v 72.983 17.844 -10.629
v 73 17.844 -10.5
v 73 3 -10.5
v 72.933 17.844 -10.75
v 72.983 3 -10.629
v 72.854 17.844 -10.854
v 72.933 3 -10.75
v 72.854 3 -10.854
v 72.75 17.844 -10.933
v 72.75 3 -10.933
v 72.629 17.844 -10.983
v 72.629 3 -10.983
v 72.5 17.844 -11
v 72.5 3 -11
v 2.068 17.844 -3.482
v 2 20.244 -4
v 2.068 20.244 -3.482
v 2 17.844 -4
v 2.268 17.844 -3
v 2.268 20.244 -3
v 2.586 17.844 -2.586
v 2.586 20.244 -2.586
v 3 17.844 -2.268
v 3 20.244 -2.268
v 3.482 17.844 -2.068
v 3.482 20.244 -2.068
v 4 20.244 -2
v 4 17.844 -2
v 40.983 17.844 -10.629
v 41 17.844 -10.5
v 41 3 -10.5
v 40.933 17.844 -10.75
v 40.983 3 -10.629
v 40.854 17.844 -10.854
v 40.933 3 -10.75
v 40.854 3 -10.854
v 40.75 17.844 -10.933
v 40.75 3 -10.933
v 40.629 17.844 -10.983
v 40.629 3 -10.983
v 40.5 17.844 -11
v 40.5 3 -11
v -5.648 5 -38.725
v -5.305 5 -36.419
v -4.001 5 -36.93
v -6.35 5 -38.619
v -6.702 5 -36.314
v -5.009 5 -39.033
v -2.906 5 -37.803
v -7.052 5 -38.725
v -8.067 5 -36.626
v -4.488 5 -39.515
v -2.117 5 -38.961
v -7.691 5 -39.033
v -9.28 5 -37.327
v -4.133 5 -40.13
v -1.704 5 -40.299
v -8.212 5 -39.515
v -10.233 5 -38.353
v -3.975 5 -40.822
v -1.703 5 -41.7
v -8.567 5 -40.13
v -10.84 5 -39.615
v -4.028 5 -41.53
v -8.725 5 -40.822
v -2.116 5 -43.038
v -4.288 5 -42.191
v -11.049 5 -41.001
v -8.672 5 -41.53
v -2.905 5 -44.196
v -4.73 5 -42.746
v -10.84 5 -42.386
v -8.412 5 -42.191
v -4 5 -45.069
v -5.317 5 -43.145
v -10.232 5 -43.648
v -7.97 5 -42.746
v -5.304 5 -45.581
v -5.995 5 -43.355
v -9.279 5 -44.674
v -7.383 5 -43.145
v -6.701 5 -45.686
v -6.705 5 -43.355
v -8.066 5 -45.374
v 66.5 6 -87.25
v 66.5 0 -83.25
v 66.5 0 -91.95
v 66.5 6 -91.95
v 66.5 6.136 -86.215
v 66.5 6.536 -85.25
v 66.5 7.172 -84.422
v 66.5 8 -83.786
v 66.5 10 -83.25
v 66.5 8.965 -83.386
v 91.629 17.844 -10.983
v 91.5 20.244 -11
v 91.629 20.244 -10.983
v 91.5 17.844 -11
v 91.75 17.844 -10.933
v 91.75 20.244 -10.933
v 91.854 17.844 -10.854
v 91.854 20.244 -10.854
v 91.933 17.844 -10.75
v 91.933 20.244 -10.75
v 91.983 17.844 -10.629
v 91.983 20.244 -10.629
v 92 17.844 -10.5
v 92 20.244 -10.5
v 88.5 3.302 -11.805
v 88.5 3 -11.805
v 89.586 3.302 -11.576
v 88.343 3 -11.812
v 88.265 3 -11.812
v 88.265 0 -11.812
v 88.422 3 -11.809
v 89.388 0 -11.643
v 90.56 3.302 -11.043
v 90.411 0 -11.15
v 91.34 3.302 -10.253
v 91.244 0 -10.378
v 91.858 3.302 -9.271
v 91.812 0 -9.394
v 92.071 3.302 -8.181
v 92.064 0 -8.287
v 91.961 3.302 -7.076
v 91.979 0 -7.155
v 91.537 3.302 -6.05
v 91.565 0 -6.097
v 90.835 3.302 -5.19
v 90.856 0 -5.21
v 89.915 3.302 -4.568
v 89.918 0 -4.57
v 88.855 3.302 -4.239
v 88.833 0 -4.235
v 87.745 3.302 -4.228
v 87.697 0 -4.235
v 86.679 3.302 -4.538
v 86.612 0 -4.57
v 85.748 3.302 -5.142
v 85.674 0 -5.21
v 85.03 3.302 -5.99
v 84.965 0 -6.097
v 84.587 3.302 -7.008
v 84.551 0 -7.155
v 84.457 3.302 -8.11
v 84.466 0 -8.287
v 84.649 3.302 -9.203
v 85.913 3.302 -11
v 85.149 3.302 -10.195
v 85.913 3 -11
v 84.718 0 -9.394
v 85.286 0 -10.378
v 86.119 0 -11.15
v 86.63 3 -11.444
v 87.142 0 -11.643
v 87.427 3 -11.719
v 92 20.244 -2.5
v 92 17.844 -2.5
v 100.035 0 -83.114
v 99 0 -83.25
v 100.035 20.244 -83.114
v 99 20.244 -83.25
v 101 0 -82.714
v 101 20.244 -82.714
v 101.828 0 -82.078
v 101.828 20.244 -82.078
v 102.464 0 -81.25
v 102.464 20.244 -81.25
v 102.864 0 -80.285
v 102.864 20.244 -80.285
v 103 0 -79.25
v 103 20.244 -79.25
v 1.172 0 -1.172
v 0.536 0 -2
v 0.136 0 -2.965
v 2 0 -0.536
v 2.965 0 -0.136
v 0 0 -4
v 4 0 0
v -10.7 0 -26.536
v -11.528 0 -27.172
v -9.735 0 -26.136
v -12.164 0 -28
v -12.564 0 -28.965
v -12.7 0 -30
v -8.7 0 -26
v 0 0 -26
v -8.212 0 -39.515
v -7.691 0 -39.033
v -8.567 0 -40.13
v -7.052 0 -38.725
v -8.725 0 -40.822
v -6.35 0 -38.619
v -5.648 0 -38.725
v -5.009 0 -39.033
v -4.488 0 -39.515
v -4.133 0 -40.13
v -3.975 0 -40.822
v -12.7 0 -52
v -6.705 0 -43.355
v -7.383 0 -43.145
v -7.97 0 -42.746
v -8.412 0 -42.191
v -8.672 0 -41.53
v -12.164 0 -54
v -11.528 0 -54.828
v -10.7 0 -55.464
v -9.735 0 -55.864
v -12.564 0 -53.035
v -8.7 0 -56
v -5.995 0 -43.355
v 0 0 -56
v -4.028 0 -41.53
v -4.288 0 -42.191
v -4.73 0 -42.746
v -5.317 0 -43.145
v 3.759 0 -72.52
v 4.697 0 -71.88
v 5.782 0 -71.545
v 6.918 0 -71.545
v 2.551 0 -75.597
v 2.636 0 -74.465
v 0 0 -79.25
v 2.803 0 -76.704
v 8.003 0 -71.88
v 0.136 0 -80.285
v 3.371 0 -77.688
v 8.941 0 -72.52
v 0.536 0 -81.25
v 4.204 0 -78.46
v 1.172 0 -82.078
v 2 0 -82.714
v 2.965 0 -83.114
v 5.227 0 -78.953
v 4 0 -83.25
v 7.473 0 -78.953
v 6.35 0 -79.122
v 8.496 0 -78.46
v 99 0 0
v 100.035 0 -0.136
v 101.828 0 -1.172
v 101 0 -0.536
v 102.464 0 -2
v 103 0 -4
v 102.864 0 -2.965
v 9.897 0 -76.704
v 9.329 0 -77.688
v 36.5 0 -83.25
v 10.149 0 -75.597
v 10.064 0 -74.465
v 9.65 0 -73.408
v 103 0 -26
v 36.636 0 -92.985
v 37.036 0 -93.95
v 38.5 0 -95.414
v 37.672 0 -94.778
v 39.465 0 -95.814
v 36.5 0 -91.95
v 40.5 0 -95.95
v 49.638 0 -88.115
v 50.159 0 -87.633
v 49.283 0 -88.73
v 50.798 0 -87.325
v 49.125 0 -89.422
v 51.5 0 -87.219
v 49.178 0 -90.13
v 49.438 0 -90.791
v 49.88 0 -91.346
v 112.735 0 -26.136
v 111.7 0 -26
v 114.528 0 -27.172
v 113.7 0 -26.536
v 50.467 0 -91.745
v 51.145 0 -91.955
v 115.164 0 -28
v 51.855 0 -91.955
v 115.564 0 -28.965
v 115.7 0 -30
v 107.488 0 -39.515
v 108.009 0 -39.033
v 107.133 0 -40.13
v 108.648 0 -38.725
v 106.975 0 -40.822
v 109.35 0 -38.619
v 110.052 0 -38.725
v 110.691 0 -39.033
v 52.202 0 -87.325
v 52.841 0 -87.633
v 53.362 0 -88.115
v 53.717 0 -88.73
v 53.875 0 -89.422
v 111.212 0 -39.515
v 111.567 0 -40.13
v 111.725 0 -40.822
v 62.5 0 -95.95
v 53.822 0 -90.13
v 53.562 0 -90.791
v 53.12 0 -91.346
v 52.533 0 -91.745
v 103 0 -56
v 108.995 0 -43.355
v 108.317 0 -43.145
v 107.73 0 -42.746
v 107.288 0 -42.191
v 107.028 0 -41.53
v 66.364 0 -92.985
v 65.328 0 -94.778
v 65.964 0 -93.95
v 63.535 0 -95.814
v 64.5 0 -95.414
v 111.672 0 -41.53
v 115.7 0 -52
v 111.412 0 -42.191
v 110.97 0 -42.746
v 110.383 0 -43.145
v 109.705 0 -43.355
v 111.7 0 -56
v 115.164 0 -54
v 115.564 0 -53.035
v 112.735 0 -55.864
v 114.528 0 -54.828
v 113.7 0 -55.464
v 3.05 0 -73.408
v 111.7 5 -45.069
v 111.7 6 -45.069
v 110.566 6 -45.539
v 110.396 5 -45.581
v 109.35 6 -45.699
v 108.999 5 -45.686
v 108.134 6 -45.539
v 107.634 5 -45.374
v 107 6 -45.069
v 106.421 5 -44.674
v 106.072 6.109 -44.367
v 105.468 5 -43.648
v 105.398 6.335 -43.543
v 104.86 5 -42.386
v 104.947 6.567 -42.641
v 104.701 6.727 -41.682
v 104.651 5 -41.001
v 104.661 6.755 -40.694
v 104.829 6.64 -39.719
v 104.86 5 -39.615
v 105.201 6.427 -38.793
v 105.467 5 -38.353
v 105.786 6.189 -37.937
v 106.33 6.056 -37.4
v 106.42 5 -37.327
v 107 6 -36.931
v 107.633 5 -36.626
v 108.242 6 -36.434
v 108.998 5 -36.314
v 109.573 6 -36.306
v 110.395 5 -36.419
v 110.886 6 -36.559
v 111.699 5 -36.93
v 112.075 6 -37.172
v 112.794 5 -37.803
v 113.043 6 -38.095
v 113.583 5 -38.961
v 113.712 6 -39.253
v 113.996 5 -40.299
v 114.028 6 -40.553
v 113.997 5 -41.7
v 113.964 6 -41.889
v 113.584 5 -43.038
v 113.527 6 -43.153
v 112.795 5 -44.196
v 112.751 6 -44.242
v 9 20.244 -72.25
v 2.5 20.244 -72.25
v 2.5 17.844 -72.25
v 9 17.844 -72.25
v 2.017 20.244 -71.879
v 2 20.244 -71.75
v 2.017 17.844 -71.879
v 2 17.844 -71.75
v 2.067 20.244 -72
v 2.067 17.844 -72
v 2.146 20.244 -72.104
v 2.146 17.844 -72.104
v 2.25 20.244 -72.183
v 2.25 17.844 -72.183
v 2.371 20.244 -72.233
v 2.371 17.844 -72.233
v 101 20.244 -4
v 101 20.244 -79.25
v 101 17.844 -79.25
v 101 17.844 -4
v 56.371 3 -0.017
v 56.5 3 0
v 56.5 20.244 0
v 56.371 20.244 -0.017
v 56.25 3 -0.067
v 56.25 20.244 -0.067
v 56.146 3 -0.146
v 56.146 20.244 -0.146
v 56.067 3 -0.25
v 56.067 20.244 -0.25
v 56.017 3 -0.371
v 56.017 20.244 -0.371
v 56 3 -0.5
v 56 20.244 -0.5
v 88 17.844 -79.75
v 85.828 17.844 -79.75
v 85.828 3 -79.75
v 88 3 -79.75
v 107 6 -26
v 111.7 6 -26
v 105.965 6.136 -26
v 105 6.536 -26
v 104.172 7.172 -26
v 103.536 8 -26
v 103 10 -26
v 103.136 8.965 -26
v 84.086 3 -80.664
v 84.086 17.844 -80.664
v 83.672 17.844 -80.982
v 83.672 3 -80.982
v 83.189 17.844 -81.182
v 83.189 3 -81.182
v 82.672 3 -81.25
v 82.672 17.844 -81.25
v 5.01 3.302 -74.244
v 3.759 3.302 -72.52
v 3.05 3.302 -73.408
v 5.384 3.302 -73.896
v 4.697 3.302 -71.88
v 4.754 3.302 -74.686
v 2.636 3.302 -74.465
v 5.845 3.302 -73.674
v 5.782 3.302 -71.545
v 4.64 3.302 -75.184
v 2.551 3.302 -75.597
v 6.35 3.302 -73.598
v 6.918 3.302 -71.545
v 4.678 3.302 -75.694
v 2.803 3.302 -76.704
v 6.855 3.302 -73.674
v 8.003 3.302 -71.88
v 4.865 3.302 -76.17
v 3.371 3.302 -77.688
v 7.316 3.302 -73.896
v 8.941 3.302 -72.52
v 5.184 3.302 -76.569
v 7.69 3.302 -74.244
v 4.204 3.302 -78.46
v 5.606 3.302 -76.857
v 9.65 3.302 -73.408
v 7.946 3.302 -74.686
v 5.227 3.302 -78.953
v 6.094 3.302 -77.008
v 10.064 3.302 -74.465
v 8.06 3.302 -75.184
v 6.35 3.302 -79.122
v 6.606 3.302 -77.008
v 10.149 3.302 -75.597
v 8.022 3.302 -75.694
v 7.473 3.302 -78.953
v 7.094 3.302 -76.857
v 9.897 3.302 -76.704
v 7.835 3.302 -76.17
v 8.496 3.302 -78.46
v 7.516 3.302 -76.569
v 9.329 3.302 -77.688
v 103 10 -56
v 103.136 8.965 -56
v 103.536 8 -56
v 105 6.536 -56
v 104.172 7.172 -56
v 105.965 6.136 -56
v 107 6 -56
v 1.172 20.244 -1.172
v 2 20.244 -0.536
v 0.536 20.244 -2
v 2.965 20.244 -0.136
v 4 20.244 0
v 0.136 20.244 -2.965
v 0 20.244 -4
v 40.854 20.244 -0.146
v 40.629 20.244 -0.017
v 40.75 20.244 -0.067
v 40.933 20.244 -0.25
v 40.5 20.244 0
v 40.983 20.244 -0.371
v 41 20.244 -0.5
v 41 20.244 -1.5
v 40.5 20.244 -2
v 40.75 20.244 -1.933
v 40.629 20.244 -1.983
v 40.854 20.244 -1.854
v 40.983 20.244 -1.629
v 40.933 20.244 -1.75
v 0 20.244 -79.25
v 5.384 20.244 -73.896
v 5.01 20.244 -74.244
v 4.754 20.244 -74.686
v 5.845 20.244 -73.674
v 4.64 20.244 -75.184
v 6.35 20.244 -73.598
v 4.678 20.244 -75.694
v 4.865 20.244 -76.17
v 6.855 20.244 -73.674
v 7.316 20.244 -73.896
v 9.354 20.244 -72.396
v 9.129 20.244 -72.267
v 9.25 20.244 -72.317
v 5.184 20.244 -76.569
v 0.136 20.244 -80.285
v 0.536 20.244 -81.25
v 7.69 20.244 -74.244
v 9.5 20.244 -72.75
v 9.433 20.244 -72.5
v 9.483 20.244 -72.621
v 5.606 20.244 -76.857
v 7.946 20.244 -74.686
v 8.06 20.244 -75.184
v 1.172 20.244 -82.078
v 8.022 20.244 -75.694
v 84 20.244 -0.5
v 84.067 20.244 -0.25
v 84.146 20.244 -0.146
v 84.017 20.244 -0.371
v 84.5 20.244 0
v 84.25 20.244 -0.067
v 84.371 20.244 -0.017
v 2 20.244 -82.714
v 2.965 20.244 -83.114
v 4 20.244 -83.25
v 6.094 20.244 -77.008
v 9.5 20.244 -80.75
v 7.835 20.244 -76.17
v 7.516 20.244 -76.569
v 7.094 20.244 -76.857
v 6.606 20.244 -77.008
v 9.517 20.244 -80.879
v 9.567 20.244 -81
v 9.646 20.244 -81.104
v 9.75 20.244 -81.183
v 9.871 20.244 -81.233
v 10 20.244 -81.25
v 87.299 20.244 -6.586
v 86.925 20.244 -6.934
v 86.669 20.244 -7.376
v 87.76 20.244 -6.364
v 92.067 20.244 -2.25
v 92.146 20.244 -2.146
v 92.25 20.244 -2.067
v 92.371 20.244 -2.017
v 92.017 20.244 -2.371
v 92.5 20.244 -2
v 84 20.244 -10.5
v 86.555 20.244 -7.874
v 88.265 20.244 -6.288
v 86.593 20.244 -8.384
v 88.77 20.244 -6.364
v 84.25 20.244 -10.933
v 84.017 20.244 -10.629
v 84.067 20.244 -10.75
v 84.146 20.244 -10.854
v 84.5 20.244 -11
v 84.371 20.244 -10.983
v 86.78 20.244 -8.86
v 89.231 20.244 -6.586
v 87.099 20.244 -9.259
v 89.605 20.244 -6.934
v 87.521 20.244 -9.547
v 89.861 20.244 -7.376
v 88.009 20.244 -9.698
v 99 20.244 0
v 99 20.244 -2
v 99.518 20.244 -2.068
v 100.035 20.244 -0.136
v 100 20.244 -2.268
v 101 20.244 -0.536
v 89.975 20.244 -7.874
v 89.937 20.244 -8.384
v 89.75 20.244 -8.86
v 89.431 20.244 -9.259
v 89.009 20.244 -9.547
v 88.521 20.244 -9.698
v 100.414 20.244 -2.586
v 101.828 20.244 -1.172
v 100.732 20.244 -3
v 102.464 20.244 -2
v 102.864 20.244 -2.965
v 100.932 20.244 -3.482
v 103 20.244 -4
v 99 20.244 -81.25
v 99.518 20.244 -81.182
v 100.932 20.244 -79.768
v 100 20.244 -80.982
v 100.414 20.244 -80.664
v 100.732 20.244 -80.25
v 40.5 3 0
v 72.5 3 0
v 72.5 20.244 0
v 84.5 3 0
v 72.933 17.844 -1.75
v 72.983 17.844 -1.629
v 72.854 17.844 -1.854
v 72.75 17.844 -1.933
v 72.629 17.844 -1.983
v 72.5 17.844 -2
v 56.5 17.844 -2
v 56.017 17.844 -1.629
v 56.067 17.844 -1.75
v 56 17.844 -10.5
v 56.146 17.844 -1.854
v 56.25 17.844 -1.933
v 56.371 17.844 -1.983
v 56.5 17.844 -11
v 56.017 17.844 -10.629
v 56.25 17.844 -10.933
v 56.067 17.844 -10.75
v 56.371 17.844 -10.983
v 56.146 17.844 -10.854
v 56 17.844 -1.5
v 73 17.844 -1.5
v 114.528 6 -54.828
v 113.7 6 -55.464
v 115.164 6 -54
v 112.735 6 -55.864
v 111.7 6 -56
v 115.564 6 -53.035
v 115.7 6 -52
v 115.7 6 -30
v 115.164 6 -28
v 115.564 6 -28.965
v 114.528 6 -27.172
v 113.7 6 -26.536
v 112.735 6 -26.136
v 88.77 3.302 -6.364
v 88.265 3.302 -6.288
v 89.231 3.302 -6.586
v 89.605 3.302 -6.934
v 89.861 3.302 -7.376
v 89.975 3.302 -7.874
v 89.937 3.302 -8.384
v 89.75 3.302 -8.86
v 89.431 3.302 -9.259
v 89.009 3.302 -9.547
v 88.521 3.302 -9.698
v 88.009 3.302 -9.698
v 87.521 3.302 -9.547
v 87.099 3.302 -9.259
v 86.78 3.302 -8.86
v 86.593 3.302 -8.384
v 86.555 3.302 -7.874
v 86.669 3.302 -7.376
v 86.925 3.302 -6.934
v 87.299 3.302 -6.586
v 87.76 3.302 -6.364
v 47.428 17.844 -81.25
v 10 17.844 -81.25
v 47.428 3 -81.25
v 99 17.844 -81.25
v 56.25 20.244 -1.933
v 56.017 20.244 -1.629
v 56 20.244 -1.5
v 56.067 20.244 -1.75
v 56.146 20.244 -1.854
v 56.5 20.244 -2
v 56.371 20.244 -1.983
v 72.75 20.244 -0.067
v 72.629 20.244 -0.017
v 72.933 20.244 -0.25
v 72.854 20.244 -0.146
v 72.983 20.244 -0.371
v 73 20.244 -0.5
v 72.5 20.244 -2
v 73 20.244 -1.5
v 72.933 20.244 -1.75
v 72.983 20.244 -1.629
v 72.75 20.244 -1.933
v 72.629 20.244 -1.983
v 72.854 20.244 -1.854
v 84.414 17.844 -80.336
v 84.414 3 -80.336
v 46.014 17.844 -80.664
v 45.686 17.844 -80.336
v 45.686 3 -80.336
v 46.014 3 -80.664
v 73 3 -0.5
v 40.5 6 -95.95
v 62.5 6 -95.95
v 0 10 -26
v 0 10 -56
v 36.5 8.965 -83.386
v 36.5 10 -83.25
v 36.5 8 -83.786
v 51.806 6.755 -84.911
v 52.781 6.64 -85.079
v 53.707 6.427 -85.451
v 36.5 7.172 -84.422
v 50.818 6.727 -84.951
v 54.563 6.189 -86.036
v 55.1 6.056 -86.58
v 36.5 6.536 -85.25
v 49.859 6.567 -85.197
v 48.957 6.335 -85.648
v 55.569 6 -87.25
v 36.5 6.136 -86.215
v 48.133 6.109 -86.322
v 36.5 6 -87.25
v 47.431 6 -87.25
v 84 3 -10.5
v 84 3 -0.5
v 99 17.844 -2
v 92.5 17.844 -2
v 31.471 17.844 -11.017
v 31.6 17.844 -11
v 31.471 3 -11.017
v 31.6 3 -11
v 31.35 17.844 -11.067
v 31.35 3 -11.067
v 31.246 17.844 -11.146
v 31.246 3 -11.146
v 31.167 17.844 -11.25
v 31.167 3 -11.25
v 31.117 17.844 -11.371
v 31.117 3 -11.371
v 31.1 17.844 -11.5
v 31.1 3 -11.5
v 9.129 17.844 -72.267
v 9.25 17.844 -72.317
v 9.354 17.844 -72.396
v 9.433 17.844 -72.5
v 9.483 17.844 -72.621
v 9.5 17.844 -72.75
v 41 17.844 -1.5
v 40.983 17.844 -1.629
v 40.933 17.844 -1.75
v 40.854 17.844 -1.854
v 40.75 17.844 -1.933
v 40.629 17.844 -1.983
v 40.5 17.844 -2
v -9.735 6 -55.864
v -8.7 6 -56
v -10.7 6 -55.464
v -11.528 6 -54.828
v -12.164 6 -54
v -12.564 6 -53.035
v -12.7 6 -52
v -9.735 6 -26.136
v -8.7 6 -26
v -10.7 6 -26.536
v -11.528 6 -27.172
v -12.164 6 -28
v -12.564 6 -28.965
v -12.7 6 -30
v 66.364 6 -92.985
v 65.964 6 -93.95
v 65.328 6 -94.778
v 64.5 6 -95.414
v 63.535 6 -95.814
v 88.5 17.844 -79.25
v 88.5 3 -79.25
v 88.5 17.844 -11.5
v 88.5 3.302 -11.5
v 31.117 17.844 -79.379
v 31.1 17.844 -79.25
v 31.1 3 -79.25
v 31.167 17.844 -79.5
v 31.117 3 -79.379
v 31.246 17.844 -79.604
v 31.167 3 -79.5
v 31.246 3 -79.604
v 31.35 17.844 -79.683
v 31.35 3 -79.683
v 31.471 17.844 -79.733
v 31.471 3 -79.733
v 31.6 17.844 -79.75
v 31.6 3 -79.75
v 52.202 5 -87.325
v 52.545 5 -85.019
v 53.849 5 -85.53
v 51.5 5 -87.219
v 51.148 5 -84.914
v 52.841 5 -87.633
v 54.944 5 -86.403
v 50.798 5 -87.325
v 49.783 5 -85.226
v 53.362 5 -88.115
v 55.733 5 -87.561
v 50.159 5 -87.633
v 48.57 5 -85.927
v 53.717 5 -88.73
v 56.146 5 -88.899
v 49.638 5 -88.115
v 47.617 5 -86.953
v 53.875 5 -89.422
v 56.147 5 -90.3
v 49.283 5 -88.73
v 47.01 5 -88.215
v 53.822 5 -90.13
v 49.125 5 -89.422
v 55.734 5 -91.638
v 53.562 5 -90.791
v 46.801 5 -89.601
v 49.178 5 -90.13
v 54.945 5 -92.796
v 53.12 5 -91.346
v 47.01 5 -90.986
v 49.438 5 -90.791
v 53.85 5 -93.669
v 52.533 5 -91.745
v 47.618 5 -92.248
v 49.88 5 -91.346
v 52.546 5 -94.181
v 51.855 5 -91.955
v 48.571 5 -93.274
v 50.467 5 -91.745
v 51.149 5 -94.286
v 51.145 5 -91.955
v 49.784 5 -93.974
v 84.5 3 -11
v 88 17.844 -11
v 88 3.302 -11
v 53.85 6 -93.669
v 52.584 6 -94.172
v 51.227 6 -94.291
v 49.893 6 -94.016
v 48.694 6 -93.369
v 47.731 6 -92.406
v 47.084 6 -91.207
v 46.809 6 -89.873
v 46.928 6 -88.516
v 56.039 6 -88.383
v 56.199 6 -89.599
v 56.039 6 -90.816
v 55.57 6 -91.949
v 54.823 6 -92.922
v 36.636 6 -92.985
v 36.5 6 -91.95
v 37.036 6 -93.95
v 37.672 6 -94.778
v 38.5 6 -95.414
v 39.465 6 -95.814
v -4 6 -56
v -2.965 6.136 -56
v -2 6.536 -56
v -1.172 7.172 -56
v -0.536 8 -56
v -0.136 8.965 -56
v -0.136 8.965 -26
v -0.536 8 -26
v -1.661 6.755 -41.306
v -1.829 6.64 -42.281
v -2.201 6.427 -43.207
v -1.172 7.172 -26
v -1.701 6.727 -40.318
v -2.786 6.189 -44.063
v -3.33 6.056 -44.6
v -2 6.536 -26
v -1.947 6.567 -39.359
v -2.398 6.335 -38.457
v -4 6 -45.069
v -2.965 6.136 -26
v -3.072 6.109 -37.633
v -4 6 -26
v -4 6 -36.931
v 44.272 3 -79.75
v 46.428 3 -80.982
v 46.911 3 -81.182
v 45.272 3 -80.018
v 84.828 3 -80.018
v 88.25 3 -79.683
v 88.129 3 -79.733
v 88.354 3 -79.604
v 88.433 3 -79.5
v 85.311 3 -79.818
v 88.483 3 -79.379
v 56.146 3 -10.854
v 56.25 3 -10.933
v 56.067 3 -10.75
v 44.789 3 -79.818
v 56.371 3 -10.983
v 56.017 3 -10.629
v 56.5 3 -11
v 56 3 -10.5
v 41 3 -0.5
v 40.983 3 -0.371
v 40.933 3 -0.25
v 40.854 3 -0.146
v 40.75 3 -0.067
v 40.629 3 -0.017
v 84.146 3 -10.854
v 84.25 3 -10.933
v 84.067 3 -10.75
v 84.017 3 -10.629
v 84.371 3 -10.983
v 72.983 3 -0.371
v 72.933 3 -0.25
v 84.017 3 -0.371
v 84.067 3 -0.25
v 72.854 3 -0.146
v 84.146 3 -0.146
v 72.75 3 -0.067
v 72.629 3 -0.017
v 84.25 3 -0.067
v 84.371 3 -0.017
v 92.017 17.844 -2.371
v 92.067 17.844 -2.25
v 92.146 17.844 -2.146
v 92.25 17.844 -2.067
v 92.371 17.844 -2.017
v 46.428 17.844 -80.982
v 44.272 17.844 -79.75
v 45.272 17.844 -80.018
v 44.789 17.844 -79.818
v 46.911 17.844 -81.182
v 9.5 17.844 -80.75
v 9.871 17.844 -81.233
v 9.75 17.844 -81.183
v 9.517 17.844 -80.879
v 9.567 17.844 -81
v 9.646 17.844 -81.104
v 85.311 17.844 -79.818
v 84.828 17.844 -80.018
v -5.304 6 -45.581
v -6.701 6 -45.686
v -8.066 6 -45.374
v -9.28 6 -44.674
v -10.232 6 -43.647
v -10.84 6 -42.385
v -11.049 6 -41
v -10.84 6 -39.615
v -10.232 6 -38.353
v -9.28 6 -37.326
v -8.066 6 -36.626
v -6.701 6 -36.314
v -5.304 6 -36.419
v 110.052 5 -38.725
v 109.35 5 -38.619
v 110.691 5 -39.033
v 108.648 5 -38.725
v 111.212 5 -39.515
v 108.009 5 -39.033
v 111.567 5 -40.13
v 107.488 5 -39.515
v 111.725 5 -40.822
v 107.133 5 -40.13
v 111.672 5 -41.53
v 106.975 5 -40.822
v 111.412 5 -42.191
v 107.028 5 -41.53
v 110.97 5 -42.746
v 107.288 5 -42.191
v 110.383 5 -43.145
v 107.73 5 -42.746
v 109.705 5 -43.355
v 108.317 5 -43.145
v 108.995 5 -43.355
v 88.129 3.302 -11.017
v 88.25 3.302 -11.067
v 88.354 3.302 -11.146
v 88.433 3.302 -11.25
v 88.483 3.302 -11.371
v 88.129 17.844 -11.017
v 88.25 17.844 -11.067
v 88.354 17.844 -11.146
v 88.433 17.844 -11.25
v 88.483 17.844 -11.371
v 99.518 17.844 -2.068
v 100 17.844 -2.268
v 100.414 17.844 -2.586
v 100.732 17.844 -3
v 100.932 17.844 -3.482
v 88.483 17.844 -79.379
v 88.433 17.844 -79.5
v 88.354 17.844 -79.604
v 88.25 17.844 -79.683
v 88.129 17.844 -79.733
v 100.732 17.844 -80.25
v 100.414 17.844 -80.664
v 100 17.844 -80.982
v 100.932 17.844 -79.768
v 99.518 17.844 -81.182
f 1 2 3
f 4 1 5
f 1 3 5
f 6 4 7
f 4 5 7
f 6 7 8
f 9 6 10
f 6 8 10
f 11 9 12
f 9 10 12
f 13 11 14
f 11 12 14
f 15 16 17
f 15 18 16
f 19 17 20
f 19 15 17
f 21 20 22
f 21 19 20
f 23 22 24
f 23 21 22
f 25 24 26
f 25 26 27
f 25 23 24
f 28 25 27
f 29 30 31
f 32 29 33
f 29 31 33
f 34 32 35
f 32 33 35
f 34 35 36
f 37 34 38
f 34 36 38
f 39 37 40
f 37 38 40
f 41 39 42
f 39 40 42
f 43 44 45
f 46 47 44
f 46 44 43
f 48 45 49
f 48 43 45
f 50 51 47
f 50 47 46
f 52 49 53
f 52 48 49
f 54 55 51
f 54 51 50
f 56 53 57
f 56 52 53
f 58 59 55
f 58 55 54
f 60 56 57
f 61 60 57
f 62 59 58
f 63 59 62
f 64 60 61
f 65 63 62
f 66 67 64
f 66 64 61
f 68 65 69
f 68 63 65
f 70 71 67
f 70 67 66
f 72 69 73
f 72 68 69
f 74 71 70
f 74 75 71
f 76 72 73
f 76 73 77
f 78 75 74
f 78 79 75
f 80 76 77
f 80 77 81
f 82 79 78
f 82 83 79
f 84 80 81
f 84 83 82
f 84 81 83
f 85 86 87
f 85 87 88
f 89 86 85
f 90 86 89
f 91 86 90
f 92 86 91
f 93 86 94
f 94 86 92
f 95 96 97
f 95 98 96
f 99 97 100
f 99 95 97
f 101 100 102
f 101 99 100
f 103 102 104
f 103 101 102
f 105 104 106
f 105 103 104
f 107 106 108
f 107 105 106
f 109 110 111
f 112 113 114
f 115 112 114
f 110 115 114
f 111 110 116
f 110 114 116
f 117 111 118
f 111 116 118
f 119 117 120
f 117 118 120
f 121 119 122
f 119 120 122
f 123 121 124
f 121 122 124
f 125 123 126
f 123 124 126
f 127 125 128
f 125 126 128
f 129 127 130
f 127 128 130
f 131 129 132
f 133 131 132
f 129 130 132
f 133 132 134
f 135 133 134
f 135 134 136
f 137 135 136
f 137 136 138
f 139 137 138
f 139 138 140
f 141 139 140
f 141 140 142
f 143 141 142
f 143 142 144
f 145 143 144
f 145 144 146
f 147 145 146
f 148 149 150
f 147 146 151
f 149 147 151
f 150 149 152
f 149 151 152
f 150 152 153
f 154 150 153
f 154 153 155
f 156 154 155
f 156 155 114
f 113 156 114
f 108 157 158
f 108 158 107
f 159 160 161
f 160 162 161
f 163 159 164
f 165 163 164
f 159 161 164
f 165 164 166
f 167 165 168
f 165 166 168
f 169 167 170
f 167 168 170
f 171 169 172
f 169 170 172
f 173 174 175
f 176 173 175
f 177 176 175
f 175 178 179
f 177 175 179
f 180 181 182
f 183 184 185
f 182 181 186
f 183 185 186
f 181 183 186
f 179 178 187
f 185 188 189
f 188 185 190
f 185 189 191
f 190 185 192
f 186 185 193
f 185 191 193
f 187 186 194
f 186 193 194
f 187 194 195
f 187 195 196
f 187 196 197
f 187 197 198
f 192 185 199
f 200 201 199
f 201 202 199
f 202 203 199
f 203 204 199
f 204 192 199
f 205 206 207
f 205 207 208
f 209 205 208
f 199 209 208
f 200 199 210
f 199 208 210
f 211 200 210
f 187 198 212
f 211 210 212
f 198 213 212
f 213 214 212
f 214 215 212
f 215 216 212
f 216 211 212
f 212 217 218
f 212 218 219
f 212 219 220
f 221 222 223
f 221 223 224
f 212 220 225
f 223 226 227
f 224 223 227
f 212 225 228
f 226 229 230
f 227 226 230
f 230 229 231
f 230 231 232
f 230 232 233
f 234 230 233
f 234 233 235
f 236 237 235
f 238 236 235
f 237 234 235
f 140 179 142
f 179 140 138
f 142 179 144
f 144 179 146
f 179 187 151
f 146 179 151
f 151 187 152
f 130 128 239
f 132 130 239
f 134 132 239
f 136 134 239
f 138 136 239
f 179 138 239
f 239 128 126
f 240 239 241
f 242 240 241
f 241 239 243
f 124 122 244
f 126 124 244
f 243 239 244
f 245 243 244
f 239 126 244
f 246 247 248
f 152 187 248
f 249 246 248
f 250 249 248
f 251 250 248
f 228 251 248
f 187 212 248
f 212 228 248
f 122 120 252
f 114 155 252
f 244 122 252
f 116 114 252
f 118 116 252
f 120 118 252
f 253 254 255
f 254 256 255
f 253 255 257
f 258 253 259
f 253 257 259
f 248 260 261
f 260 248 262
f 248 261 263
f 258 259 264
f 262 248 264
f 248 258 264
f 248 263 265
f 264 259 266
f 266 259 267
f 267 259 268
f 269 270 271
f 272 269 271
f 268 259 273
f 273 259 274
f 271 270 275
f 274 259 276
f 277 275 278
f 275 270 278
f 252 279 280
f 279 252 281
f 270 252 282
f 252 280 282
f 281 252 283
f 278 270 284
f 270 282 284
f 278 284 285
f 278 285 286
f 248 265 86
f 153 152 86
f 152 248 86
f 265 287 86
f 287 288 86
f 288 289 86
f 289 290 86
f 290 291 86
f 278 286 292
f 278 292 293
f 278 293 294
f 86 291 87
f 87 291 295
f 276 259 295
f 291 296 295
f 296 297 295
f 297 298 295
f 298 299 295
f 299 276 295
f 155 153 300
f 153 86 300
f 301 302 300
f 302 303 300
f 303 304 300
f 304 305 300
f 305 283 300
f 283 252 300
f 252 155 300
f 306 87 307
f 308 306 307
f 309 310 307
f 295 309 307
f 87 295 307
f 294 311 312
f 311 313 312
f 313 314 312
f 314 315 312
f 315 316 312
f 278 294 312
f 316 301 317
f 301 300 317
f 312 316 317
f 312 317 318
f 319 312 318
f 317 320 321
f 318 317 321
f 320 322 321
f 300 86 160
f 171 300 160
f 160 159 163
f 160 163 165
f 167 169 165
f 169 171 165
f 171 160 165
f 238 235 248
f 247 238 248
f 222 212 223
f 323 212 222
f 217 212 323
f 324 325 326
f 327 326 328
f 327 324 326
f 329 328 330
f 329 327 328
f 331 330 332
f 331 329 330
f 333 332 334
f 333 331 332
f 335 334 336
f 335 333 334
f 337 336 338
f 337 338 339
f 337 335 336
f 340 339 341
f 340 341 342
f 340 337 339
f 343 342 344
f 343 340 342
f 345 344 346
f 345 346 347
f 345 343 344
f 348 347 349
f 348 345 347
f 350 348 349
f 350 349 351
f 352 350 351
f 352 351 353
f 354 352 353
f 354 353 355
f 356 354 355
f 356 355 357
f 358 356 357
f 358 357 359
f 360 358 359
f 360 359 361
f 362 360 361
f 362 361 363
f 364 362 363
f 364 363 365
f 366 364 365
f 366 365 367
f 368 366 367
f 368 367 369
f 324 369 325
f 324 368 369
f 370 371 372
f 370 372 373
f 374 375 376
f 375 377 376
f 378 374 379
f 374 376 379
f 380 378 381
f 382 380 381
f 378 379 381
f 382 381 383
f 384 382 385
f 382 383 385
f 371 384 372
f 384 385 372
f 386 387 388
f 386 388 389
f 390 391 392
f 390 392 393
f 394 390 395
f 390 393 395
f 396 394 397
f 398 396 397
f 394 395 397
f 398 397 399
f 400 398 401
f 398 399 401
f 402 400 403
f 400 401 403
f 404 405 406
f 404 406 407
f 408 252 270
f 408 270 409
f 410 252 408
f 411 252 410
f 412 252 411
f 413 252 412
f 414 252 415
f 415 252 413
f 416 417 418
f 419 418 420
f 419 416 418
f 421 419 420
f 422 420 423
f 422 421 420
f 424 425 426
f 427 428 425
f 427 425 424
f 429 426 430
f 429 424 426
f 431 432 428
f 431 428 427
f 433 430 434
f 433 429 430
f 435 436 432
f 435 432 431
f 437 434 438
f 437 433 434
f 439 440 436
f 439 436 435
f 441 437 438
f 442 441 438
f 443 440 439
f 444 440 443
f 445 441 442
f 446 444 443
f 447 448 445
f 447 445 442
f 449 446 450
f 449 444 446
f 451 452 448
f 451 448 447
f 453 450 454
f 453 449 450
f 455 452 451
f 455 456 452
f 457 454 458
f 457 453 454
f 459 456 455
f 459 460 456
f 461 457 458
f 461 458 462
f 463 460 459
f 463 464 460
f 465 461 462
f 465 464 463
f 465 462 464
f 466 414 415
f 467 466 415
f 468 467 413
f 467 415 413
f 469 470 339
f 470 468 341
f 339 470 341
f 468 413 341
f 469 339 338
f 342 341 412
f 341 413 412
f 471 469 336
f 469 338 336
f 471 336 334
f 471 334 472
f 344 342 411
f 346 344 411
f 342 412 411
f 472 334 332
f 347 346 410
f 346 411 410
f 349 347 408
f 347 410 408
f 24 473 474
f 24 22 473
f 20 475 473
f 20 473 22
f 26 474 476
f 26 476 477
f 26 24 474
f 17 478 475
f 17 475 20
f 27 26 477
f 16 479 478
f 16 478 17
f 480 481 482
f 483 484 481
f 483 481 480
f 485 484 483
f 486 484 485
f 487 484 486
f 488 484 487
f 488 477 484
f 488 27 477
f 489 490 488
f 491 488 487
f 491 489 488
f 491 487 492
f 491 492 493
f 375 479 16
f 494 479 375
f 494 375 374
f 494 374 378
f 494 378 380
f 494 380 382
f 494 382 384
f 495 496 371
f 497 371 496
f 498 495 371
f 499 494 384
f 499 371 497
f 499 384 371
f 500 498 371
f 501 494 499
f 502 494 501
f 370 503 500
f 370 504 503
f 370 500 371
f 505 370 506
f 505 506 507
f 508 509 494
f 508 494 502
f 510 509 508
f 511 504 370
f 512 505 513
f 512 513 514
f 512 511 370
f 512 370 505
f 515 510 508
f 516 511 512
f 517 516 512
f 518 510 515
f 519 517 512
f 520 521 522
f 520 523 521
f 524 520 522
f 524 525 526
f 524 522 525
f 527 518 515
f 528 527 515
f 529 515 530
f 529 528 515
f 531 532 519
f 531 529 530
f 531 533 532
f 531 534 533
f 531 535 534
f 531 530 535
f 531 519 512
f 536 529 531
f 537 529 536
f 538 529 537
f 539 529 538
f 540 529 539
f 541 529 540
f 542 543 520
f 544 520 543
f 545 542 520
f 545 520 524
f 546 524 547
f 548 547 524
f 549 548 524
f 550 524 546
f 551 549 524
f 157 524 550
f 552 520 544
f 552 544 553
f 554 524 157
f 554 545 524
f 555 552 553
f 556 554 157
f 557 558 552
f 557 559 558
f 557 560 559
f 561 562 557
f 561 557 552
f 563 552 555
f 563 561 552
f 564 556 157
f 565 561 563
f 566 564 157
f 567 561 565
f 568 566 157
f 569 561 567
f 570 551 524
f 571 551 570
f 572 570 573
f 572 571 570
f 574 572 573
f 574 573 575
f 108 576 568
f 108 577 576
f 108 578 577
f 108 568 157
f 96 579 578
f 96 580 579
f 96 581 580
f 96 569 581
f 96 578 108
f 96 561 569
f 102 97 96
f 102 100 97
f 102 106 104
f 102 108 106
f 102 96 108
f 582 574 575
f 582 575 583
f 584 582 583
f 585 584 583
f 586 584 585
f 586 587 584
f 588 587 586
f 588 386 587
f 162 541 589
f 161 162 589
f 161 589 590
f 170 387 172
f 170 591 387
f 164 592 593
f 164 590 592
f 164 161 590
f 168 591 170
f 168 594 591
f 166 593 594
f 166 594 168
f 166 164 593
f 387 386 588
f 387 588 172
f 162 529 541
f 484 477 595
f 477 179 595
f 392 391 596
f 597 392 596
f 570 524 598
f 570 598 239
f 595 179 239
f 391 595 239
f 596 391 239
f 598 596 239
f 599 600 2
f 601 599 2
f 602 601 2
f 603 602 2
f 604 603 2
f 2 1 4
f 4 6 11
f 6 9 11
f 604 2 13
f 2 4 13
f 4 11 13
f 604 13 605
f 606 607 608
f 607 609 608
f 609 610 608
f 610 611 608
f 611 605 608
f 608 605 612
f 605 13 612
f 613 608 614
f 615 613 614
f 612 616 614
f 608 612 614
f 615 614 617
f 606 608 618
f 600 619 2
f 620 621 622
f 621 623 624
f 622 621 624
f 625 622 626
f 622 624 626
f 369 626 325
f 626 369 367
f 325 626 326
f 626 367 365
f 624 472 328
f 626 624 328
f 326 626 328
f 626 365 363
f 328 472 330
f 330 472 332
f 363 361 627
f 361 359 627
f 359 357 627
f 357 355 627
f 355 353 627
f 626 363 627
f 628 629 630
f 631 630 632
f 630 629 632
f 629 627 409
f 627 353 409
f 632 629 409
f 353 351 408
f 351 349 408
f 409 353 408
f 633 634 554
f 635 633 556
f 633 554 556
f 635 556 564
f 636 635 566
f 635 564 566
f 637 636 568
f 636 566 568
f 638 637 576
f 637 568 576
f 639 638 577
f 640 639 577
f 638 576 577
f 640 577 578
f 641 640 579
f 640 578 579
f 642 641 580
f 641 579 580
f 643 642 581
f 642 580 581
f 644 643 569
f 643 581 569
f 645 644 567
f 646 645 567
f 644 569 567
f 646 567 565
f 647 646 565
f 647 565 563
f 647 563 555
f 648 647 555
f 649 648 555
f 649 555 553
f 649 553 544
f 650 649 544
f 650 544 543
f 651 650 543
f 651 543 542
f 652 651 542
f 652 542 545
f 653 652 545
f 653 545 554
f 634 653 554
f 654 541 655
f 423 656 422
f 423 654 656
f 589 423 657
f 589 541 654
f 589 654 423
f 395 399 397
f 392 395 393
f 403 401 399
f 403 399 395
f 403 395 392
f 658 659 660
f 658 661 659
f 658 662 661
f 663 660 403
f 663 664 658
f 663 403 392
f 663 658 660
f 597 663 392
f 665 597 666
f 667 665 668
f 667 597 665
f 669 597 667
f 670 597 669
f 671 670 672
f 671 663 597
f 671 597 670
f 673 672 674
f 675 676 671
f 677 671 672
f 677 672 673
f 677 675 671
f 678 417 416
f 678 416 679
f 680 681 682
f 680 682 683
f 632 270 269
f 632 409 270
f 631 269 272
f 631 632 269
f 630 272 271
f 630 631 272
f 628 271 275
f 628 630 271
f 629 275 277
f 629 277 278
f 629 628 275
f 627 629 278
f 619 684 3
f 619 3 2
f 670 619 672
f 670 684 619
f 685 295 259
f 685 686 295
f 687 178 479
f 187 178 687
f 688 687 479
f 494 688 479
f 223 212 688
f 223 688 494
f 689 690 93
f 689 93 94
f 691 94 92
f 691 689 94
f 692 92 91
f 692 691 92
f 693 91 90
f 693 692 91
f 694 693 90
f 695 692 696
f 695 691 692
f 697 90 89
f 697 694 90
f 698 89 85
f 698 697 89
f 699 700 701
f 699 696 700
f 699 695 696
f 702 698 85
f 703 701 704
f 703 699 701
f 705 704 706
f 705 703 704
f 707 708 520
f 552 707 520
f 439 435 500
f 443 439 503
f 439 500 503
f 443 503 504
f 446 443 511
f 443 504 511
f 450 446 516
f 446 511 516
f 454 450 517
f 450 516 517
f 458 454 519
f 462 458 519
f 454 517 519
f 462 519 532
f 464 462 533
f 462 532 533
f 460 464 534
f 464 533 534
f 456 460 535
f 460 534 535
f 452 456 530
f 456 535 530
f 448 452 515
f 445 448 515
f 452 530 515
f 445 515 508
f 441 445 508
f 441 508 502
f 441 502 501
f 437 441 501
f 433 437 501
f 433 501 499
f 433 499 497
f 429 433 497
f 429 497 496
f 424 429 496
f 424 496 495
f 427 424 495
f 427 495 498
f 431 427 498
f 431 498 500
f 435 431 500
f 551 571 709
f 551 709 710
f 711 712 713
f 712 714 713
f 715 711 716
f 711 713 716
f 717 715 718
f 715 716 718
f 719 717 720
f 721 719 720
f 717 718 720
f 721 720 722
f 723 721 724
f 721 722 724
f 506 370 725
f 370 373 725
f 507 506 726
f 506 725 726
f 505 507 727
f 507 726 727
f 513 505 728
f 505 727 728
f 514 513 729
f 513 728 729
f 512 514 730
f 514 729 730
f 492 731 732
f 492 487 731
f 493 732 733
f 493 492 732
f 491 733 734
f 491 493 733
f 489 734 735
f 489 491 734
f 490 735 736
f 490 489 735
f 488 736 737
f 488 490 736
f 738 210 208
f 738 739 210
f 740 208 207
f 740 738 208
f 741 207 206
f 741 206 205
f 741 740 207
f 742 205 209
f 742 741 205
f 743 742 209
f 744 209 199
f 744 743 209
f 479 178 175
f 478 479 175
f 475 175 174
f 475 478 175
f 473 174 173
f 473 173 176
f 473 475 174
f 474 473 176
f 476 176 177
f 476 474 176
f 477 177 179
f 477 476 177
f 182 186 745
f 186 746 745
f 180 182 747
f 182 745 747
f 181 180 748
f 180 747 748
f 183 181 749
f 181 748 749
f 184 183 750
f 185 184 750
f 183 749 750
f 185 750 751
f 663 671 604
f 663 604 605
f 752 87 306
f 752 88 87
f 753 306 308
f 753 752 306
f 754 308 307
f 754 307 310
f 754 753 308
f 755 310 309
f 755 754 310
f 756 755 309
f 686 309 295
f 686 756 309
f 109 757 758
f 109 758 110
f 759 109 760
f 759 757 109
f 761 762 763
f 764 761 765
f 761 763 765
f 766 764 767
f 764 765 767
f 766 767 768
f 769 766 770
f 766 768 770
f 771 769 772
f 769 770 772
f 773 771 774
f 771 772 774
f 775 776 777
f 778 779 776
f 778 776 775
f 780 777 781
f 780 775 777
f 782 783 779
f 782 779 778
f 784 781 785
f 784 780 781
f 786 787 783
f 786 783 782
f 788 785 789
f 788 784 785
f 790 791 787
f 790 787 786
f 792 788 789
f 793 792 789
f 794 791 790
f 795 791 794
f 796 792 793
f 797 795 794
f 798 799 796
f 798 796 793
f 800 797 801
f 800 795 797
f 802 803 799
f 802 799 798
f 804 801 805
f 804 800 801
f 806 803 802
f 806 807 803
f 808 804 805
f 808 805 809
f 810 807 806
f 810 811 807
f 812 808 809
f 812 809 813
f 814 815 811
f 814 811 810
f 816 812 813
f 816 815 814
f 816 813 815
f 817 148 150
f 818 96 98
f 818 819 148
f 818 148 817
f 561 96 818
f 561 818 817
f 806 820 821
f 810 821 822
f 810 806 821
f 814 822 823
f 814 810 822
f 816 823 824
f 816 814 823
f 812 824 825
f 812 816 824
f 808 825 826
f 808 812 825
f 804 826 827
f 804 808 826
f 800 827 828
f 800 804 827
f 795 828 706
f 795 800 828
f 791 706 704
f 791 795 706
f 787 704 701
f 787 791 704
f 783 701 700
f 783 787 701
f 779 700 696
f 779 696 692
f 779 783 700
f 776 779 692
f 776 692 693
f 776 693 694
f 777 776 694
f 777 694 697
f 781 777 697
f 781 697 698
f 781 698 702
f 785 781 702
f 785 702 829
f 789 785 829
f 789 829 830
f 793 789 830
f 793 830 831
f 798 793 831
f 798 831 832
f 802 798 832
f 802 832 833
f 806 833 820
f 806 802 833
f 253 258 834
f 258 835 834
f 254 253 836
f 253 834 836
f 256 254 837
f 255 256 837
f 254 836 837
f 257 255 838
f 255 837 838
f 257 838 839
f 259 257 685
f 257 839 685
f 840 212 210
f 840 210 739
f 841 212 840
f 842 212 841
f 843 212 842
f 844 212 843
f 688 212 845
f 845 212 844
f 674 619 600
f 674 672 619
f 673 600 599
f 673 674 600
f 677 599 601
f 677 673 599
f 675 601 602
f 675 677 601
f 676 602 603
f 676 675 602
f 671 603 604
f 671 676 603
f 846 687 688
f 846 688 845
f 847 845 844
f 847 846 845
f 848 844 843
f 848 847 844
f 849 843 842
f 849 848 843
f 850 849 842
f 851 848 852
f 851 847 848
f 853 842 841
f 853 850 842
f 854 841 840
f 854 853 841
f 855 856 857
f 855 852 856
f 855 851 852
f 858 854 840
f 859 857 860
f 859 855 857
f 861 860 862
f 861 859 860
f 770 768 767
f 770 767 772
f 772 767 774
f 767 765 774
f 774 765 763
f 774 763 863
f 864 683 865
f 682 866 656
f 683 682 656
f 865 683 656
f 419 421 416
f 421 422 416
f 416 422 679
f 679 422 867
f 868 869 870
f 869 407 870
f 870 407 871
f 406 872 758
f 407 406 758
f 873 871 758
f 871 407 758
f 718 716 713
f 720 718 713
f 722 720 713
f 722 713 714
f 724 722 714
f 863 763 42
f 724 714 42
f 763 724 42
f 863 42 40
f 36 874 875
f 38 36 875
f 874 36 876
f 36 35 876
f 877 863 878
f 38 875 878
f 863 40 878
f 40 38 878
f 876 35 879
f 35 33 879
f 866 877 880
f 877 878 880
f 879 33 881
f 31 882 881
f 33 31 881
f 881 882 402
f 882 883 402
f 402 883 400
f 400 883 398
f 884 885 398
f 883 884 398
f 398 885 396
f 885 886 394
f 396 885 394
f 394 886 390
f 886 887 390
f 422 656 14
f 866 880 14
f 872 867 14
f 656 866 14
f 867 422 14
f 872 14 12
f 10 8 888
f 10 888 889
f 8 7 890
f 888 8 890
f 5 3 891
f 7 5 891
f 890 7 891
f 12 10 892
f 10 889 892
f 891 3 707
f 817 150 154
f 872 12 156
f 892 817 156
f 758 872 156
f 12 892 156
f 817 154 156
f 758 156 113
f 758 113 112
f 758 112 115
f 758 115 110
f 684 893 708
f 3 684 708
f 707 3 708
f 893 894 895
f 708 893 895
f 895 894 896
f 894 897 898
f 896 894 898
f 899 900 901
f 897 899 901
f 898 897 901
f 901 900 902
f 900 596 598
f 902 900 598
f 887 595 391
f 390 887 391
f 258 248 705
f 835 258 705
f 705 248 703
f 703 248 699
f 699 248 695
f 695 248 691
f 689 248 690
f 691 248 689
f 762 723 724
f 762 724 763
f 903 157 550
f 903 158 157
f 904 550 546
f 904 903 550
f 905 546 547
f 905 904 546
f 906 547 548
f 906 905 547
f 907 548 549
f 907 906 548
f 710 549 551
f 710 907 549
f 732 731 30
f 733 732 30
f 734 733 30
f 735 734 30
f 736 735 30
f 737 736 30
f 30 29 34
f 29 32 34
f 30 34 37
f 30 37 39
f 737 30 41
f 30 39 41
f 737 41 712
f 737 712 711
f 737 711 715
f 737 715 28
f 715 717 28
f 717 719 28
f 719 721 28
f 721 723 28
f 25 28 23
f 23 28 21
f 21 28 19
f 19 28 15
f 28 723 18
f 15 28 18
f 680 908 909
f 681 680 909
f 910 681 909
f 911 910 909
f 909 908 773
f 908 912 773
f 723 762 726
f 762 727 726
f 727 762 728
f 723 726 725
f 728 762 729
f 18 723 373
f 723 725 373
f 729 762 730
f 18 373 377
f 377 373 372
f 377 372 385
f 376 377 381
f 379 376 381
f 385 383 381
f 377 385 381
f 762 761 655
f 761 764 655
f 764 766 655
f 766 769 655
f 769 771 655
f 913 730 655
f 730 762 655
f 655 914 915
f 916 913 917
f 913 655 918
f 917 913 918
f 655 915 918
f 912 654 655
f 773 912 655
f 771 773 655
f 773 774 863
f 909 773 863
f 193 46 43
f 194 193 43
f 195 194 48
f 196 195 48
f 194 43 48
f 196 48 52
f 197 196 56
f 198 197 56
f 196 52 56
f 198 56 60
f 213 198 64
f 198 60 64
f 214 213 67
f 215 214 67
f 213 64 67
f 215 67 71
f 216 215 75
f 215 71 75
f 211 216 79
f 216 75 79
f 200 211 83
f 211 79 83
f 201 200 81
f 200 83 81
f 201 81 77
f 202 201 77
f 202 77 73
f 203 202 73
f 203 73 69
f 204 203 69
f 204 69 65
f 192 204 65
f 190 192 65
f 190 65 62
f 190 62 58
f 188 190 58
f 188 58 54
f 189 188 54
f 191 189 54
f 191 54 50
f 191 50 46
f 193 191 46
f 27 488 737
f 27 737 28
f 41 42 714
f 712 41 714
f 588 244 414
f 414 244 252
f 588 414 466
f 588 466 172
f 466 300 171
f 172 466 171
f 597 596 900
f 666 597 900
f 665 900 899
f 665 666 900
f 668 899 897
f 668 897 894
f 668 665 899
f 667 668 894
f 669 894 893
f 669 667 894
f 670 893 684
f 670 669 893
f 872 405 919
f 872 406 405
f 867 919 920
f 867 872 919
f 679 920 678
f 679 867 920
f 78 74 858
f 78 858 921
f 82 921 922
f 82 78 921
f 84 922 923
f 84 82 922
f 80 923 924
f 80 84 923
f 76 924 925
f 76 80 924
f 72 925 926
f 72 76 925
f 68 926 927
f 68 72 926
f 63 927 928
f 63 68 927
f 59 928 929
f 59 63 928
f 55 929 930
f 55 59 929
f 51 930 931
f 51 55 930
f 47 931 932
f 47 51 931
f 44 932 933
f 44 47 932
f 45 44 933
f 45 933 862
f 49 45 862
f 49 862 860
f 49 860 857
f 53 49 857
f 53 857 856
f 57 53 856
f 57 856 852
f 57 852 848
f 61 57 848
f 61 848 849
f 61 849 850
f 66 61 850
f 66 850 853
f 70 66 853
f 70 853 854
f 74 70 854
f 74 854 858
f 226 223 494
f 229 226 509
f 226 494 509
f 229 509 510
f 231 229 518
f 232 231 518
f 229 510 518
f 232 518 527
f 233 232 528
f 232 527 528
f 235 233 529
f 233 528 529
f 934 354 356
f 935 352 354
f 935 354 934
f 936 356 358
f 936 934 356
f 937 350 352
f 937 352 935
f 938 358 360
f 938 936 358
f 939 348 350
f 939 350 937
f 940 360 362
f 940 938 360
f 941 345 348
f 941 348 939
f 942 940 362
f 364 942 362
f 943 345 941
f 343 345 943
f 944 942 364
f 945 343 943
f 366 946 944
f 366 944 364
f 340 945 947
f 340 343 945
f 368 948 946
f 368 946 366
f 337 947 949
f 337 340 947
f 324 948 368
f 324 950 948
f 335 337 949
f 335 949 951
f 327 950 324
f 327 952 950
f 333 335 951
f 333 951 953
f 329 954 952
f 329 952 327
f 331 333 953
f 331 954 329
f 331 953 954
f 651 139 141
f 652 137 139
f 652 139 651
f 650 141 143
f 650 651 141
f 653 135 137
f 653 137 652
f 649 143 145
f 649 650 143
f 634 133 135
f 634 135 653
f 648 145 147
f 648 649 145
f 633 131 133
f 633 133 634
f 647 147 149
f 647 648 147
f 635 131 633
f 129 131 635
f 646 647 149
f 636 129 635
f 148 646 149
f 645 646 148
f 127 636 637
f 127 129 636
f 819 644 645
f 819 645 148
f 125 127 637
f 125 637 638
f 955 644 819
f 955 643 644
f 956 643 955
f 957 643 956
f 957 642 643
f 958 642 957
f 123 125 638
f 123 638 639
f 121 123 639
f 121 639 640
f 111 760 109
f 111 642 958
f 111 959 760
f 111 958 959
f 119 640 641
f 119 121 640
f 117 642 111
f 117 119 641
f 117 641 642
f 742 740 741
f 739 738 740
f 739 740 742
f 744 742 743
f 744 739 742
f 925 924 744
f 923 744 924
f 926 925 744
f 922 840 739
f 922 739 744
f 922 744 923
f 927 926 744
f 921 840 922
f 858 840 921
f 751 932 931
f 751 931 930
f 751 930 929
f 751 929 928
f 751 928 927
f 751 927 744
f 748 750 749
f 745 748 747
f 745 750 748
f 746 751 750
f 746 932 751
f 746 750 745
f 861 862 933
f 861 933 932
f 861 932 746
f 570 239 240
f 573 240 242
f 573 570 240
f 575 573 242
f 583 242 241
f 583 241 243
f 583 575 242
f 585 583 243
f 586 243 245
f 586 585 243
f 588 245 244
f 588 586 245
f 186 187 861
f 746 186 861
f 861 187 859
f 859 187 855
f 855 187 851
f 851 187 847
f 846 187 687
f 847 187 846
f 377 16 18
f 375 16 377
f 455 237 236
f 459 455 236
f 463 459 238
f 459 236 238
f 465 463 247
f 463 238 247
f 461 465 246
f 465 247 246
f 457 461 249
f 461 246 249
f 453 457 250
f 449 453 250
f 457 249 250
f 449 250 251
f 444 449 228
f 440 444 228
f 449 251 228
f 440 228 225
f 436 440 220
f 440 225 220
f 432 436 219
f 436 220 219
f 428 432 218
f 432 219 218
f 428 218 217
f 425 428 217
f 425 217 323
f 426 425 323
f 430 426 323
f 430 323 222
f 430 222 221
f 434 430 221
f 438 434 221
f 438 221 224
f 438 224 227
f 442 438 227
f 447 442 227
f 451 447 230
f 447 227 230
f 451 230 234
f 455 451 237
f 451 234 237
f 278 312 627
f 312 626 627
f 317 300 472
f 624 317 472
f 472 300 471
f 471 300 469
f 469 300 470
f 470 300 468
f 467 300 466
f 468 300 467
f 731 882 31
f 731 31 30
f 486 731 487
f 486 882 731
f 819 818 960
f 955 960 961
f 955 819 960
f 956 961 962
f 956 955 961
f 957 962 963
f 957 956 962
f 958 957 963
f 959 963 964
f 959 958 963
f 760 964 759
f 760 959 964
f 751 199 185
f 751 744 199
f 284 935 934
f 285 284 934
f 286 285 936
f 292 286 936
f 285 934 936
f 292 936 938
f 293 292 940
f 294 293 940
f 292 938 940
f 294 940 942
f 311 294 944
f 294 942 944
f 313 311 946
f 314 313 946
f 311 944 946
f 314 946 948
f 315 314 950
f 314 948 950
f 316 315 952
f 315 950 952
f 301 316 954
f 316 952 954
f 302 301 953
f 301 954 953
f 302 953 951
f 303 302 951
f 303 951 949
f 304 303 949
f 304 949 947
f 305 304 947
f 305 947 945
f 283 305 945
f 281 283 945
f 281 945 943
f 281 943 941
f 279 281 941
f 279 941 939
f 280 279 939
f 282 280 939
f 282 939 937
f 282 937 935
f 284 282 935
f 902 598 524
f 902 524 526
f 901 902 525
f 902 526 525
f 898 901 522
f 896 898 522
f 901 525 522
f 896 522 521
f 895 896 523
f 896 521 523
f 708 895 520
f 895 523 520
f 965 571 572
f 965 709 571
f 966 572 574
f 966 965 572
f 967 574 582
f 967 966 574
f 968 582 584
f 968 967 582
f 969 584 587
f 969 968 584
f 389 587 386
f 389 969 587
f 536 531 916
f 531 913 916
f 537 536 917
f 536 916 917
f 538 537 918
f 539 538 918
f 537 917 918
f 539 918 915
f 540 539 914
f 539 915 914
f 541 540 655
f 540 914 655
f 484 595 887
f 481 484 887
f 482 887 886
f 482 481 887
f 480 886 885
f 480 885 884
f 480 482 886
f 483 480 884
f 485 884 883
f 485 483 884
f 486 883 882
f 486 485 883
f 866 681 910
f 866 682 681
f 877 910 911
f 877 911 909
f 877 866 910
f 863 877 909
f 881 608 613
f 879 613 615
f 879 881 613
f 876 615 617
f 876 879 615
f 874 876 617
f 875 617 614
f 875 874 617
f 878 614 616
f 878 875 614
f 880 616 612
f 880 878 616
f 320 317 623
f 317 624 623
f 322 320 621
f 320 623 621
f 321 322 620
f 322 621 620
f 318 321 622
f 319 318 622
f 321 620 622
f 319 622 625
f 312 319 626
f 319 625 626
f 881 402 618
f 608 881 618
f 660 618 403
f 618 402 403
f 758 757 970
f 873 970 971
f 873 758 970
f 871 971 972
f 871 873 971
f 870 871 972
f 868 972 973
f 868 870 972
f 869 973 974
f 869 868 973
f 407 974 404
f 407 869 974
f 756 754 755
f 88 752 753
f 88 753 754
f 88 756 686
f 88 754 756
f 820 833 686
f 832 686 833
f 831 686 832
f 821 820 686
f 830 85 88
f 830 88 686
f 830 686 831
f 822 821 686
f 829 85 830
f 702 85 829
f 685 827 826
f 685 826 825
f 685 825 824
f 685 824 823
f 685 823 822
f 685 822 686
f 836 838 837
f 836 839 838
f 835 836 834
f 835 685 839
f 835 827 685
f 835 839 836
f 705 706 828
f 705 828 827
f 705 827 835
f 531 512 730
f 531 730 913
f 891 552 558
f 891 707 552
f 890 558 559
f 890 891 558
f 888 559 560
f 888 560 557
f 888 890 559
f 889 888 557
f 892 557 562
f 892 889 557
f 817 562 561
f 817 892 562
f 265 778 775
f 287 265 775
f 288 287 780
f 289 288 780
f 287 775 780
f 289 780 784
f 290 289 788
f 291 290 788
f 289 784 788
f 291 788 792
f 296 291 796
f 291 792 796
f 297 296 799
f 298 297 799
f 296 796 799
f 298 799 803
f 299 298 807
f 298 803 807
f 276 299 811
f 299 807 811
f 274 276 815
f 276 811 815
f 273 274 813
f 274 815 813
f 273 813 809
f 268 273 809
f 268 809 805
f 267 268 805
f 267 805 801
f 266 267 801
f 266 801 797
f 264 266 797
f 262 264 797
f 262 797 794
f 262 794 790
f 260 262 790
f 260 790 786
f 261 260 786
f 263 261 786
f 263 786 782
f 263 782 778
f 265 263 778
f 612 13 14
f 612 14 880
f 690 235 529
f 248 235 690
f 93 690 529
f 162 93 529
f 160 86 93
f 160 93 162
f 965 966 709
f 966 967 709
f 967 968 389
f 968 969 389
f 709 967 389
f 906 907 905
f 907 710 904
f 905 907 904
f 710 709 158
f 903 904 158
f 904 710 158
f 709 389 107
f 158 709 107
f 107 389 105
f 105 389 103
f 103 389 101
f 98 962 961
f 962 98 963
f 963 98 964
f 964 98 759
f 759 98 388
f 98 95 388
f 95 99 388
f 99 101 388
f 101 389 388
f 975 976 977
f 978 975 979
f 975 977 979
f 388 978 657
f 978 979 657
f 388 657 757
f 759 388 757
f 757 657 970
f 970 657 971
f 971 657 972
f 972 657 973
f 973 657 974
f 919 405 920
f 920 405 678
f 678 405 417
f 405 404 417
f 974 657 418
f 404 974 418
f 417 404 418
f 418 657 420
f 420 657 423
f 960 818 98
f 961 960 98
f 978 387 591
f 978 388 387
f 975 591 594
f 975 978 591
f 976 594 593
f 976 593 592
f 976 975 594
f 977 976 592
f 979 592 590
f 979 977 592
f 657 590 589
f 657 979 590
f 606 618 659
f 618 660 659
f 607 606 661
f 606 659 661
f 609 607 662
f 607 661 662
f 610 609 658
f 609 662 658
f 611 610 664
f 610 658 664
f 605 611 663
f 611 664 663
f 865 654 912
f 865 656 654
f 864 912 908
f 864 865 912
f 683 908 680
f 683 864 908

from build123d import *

# Parameters (mm, degrees)
SKETCH1_W           = 103
SKETCH1_H           = 83.25
BOSS_EXTRUDE1_DEPTH = 20.2438
CUT_EXTRUDE1_DEPTH  = 17.2438
SKETCH3_W           = 15
SKETCH3_H           = 17.2438
SKETCH3_W_2         = 11
CUT_EXTRUDE2_DEPTH  = 14.9225
CUT_EXTRUDE3_DEPTH  = 2.4
SKETCH5_W           = 30
SKETCH5_H           = 6
BOSS_EXTRUDE2_DEPTH = 12.7
SKETCH6_W           = 30
SKETCH6_H           = 6
BOSS_EXTRUDE3_DEPTH = 12.7
FILLET1_R           = 4
FILLET2_R           = 0.5
FILLET3_R           = 2
FILLET4_R           = 4
FILLET5_R           = 2
SKETCH7_R           = 1.7145
CUT_EXTRUDE4_DEPTH  = 152.66642324
SKETCH8_R           = 3.81
CUT_EXTRUDE5_DEPTH  = 3.302
SKETCH11_R          = 2.38125
CUT_EXTRUDE7_DEPTH  = 151.98270874
CUT_EXTRUDE8_START  = -1
SKETCH12_R          = 4.699
CUT_EXTRUDE8_DEPTH  = 152.98270874


with BuildPart() as part:
    # Sketch1 → Boss-Extrude1 (new body)
    with BuildSketch(Plane(origin=(0, 0, 0), x_dir=(1, 0, 0), z_dir=(0, 1, 0))):
        with Locations((51.5, 41.625)):
            Rectangle(SKETCH1_W, SKETCH1_H)
    extrude(amount=BOSS_EXTRUDE1_DEPTH)

    # Sketch2 → Cut-Extrude1 (cut)
    with BuildSketch(Plane(origin=(0, 20.2438, 0), x_dir=(1, 0, 0), z_dir=(0, 1, 0))):
        Polygon((31.1, 79.75), (45.1, 79.75), (46.6, 81.25), (83.5, 81.25), (85, 79.75), (88.5, 79.75), (88.5, 11), (31.1, 11), align=None)
    extrude(amount=-CUT_EXTRUDE1_DEPTH, mode=Mode.SUBTRACT)

    # Sketch3 → Cut-Extrude2 (cut)
    with BuildSketch(Plane.XY):
        with Locations((48.5, 11.6219)):
            Rectangle(SKETCH3_W, SKETCH3_H)
        with Locations((78.5, 11.6219)):
            Rectangle(SKETCH3_W_2, SKETCH3_H)
    extrude(amount=-CUT_EXTRUDE2_DEPTH, mode=Mode.SUBTRACT)

    # Sketch4 → Cut-Extrude3 (cut)
    with BuildSketch(Plane(origin=(0, 20.2438, 0), x_dir=(1, 0, 0), z_dir=(0, 1, 0))):
        Polygon((9.5, 81.25), (101, 81.25), (101, 2), (92, 2), (92, 11), (84, 11), (84, 2), (2, 2), (2, 72.25), (9.5, 72.25), align=None)
    extrude(amount=-CUT_EXTRUDE3_DEPTH, mode=Mode.SUBTRACT)

    # Sketch5 → Boss-Extrude2 (add)
    with BuildSketch(Plane.ZY):
        with Locations((-41, 3)):
            Rectangle(SKETCH5_W, SKETCH5_H)
    boss_extrude2 = extrude(amount=BOSS_EXTRUDE2_DEPTH)

    # Mirror1: Boss-Extrude2 across plane
    add(boss_extrude2.mirror(Plane.ZY.offset(-51.5)))

    # Sketch6 → Boss-Extrude3 (add)
    with BuildSketch(Plane(origin=(0, 0, -83.25), x_dir=(-1, 0, 0), z_dir=(0, 0, -1))):
        with Locations((-51.5, 3)):
            Rectangle(SKETCH6_W, SKETCH6_H)
    extrude(amount=BOSS_EXTRUDE3_DEPTH)

    # Fillet1
    fillet1_edges = [part.edges().sort_by_distance(p)[0] for p in [
        (0, 10.1219, -83.25),
        (103, 10.1219, -83.25),
        (103, 10.1219, 0),
        (0, 10.1219, 0),
    ]]
    fillet(fillet1_edges, radius=FILLET1_R)

    # Fillet2
    fillet2_edges = [part.edges().sort_by_distance(p)[0] for p in [
        (9.5, 19.0438, -81.25),
        (92, 19.0438, -11),
        (73, 19.0438, -2),
        (41, 19.0438, -2),
        (92, 19.0438, -2),
        (2, 19.0438, -72.25),
        (9.5, 19.0438, -72.25),
        (88.5, 10.4219, -11),
        (88.5, 10.4219, -79.75),
        (31.1, 10.4219, -79.75),
        (31.1, 10.4219, -11),
        (84, 11.6219, -11),
        (56, 10.4219, -11),
        (41, 11.6219, 0),
        (56, 11.6219, 0),
        (73, 11.6219, 0),
        (84, 11.6219, 0),
        (56, 19.0438, -2),
        (41, 10.4219, -11),
        (73, 10.4219, -11),
    ]]
    fillet(fillet2_edges, radius=FILLET2_R)

    # Fillet3
    fillet3_edges = [part.edges().sort_by_distance(p)[0] for p in [
        (101, 19.0438, -2),
        (2, 19.0438, -2),
        (101, 19.0438, -81.25),
    ]]
    fillet(fillet3_edges, radius=FILLET3_R)

    # Fillet4
    fillet4_edges = [part.edges().sort_by_distance(p)[0] for p in [
        (0, 6, -41),
        (-12.7, 3, -56),
        (-12.7, 3, -26),
        (115.7, 3, -56),
        (115.7, 3, -26),
        (103, 6, -41),
        (51.5, 6, -83.25),
        (66.5, 3, -95.95),
        (36.5, 3, -95.95),
    ]]
    fillet(fillet4_edges, radius=FILLET4_R)

    # Fillet5
    fillet5_edges = [part.edges().sort_by_distance(p)[0] for p in [
        (85, 10.4219, -79.75),
        (83.5, 10.4219, -81.25),
        (46.6, 10.4219, -81.25),
        (45.1, 10.4219, -79.75),
    ]]
    fillet(fillet5_edges, radius=FILLET5_R)

    # Sketch7 → Cut-Extrude4 (cut, through all)
    with BuildSketch(Plane(origin=(0, 20.2438, 0), x_dir=(1, 0, 0), z_dir=(0, 1, 0))):
        with Locations(Location((6.35, 75.3125, 0), (0, 0, 270))):
            Circle(SKETCH7_R)
        with Locations(Location((88.265, 8.0025, 0), (0, 0, 270))):
            Circle(SKETCH7_R)
    extrude(amount=-CUT_EXTRUDE4_DEPTH, mode=Mode.SUBTRACT)

    # Sketch8 → Cut-Extrude5 (cut)
    with BuildSketch(Plane.XZ):
        with Locations(Location((6.35, -75.3125, 0), (0, 0, 270))):
            Circle(SKETCH8_R)
        with Locations(Location((88.265, -8.0025, 0), (0, 0, 270))):
            Circle(SKETCH8_R)
    extrude(amount=-CUT_EXTRUDE5_DEPTH, mode=Mode.SUBTRACT)

    # Sketch11 → Cut-Extrude7 (cut, through all)
    with BuildSketch(Plane(origin=(0, 6, 0), x_dir=(1, 0, 0), z_dir=(0, 1, 0))):
        with Locations(Location((-6.35, 41, 0), (0, 0, 270))):
            Circle(SKETCH11_R)
    cut_extrude7 = extrude(amount=-CUT_EXTRUDE7_DEPTH, mode=Mode.SUBTRACT)

    # Sketch12 → Cut-Extrude8 (cut)
    with BuildSketch(Plane(origin=(0, 6, 0), x_dir=(1, 0, 0), z_dir=(0, 1, 0)).offset(CUT_EXTRUDE8_START)):
        with Locations(Location((-6.35, 41, 0), (0, 0, 59.992960011))):
            Circle(SKETCH12_R)
    cut_extrude8 = extrude(amount=CUT_EXTRUDE8_DEPTH, mode=Mode.SUBTRACT)

    # Sketch-Pattern2: Cut-Extrude7, Cut-Extrude8 at 2 more places
    with Locations((57.85, 0, -48.6), (115.7, 0, 0)):
        add(cut_extrude7, mode=Mode.SUBTRACT)
        add(cut_extrude8, mode=Mode.SUBTRACT)


solid = part.part
